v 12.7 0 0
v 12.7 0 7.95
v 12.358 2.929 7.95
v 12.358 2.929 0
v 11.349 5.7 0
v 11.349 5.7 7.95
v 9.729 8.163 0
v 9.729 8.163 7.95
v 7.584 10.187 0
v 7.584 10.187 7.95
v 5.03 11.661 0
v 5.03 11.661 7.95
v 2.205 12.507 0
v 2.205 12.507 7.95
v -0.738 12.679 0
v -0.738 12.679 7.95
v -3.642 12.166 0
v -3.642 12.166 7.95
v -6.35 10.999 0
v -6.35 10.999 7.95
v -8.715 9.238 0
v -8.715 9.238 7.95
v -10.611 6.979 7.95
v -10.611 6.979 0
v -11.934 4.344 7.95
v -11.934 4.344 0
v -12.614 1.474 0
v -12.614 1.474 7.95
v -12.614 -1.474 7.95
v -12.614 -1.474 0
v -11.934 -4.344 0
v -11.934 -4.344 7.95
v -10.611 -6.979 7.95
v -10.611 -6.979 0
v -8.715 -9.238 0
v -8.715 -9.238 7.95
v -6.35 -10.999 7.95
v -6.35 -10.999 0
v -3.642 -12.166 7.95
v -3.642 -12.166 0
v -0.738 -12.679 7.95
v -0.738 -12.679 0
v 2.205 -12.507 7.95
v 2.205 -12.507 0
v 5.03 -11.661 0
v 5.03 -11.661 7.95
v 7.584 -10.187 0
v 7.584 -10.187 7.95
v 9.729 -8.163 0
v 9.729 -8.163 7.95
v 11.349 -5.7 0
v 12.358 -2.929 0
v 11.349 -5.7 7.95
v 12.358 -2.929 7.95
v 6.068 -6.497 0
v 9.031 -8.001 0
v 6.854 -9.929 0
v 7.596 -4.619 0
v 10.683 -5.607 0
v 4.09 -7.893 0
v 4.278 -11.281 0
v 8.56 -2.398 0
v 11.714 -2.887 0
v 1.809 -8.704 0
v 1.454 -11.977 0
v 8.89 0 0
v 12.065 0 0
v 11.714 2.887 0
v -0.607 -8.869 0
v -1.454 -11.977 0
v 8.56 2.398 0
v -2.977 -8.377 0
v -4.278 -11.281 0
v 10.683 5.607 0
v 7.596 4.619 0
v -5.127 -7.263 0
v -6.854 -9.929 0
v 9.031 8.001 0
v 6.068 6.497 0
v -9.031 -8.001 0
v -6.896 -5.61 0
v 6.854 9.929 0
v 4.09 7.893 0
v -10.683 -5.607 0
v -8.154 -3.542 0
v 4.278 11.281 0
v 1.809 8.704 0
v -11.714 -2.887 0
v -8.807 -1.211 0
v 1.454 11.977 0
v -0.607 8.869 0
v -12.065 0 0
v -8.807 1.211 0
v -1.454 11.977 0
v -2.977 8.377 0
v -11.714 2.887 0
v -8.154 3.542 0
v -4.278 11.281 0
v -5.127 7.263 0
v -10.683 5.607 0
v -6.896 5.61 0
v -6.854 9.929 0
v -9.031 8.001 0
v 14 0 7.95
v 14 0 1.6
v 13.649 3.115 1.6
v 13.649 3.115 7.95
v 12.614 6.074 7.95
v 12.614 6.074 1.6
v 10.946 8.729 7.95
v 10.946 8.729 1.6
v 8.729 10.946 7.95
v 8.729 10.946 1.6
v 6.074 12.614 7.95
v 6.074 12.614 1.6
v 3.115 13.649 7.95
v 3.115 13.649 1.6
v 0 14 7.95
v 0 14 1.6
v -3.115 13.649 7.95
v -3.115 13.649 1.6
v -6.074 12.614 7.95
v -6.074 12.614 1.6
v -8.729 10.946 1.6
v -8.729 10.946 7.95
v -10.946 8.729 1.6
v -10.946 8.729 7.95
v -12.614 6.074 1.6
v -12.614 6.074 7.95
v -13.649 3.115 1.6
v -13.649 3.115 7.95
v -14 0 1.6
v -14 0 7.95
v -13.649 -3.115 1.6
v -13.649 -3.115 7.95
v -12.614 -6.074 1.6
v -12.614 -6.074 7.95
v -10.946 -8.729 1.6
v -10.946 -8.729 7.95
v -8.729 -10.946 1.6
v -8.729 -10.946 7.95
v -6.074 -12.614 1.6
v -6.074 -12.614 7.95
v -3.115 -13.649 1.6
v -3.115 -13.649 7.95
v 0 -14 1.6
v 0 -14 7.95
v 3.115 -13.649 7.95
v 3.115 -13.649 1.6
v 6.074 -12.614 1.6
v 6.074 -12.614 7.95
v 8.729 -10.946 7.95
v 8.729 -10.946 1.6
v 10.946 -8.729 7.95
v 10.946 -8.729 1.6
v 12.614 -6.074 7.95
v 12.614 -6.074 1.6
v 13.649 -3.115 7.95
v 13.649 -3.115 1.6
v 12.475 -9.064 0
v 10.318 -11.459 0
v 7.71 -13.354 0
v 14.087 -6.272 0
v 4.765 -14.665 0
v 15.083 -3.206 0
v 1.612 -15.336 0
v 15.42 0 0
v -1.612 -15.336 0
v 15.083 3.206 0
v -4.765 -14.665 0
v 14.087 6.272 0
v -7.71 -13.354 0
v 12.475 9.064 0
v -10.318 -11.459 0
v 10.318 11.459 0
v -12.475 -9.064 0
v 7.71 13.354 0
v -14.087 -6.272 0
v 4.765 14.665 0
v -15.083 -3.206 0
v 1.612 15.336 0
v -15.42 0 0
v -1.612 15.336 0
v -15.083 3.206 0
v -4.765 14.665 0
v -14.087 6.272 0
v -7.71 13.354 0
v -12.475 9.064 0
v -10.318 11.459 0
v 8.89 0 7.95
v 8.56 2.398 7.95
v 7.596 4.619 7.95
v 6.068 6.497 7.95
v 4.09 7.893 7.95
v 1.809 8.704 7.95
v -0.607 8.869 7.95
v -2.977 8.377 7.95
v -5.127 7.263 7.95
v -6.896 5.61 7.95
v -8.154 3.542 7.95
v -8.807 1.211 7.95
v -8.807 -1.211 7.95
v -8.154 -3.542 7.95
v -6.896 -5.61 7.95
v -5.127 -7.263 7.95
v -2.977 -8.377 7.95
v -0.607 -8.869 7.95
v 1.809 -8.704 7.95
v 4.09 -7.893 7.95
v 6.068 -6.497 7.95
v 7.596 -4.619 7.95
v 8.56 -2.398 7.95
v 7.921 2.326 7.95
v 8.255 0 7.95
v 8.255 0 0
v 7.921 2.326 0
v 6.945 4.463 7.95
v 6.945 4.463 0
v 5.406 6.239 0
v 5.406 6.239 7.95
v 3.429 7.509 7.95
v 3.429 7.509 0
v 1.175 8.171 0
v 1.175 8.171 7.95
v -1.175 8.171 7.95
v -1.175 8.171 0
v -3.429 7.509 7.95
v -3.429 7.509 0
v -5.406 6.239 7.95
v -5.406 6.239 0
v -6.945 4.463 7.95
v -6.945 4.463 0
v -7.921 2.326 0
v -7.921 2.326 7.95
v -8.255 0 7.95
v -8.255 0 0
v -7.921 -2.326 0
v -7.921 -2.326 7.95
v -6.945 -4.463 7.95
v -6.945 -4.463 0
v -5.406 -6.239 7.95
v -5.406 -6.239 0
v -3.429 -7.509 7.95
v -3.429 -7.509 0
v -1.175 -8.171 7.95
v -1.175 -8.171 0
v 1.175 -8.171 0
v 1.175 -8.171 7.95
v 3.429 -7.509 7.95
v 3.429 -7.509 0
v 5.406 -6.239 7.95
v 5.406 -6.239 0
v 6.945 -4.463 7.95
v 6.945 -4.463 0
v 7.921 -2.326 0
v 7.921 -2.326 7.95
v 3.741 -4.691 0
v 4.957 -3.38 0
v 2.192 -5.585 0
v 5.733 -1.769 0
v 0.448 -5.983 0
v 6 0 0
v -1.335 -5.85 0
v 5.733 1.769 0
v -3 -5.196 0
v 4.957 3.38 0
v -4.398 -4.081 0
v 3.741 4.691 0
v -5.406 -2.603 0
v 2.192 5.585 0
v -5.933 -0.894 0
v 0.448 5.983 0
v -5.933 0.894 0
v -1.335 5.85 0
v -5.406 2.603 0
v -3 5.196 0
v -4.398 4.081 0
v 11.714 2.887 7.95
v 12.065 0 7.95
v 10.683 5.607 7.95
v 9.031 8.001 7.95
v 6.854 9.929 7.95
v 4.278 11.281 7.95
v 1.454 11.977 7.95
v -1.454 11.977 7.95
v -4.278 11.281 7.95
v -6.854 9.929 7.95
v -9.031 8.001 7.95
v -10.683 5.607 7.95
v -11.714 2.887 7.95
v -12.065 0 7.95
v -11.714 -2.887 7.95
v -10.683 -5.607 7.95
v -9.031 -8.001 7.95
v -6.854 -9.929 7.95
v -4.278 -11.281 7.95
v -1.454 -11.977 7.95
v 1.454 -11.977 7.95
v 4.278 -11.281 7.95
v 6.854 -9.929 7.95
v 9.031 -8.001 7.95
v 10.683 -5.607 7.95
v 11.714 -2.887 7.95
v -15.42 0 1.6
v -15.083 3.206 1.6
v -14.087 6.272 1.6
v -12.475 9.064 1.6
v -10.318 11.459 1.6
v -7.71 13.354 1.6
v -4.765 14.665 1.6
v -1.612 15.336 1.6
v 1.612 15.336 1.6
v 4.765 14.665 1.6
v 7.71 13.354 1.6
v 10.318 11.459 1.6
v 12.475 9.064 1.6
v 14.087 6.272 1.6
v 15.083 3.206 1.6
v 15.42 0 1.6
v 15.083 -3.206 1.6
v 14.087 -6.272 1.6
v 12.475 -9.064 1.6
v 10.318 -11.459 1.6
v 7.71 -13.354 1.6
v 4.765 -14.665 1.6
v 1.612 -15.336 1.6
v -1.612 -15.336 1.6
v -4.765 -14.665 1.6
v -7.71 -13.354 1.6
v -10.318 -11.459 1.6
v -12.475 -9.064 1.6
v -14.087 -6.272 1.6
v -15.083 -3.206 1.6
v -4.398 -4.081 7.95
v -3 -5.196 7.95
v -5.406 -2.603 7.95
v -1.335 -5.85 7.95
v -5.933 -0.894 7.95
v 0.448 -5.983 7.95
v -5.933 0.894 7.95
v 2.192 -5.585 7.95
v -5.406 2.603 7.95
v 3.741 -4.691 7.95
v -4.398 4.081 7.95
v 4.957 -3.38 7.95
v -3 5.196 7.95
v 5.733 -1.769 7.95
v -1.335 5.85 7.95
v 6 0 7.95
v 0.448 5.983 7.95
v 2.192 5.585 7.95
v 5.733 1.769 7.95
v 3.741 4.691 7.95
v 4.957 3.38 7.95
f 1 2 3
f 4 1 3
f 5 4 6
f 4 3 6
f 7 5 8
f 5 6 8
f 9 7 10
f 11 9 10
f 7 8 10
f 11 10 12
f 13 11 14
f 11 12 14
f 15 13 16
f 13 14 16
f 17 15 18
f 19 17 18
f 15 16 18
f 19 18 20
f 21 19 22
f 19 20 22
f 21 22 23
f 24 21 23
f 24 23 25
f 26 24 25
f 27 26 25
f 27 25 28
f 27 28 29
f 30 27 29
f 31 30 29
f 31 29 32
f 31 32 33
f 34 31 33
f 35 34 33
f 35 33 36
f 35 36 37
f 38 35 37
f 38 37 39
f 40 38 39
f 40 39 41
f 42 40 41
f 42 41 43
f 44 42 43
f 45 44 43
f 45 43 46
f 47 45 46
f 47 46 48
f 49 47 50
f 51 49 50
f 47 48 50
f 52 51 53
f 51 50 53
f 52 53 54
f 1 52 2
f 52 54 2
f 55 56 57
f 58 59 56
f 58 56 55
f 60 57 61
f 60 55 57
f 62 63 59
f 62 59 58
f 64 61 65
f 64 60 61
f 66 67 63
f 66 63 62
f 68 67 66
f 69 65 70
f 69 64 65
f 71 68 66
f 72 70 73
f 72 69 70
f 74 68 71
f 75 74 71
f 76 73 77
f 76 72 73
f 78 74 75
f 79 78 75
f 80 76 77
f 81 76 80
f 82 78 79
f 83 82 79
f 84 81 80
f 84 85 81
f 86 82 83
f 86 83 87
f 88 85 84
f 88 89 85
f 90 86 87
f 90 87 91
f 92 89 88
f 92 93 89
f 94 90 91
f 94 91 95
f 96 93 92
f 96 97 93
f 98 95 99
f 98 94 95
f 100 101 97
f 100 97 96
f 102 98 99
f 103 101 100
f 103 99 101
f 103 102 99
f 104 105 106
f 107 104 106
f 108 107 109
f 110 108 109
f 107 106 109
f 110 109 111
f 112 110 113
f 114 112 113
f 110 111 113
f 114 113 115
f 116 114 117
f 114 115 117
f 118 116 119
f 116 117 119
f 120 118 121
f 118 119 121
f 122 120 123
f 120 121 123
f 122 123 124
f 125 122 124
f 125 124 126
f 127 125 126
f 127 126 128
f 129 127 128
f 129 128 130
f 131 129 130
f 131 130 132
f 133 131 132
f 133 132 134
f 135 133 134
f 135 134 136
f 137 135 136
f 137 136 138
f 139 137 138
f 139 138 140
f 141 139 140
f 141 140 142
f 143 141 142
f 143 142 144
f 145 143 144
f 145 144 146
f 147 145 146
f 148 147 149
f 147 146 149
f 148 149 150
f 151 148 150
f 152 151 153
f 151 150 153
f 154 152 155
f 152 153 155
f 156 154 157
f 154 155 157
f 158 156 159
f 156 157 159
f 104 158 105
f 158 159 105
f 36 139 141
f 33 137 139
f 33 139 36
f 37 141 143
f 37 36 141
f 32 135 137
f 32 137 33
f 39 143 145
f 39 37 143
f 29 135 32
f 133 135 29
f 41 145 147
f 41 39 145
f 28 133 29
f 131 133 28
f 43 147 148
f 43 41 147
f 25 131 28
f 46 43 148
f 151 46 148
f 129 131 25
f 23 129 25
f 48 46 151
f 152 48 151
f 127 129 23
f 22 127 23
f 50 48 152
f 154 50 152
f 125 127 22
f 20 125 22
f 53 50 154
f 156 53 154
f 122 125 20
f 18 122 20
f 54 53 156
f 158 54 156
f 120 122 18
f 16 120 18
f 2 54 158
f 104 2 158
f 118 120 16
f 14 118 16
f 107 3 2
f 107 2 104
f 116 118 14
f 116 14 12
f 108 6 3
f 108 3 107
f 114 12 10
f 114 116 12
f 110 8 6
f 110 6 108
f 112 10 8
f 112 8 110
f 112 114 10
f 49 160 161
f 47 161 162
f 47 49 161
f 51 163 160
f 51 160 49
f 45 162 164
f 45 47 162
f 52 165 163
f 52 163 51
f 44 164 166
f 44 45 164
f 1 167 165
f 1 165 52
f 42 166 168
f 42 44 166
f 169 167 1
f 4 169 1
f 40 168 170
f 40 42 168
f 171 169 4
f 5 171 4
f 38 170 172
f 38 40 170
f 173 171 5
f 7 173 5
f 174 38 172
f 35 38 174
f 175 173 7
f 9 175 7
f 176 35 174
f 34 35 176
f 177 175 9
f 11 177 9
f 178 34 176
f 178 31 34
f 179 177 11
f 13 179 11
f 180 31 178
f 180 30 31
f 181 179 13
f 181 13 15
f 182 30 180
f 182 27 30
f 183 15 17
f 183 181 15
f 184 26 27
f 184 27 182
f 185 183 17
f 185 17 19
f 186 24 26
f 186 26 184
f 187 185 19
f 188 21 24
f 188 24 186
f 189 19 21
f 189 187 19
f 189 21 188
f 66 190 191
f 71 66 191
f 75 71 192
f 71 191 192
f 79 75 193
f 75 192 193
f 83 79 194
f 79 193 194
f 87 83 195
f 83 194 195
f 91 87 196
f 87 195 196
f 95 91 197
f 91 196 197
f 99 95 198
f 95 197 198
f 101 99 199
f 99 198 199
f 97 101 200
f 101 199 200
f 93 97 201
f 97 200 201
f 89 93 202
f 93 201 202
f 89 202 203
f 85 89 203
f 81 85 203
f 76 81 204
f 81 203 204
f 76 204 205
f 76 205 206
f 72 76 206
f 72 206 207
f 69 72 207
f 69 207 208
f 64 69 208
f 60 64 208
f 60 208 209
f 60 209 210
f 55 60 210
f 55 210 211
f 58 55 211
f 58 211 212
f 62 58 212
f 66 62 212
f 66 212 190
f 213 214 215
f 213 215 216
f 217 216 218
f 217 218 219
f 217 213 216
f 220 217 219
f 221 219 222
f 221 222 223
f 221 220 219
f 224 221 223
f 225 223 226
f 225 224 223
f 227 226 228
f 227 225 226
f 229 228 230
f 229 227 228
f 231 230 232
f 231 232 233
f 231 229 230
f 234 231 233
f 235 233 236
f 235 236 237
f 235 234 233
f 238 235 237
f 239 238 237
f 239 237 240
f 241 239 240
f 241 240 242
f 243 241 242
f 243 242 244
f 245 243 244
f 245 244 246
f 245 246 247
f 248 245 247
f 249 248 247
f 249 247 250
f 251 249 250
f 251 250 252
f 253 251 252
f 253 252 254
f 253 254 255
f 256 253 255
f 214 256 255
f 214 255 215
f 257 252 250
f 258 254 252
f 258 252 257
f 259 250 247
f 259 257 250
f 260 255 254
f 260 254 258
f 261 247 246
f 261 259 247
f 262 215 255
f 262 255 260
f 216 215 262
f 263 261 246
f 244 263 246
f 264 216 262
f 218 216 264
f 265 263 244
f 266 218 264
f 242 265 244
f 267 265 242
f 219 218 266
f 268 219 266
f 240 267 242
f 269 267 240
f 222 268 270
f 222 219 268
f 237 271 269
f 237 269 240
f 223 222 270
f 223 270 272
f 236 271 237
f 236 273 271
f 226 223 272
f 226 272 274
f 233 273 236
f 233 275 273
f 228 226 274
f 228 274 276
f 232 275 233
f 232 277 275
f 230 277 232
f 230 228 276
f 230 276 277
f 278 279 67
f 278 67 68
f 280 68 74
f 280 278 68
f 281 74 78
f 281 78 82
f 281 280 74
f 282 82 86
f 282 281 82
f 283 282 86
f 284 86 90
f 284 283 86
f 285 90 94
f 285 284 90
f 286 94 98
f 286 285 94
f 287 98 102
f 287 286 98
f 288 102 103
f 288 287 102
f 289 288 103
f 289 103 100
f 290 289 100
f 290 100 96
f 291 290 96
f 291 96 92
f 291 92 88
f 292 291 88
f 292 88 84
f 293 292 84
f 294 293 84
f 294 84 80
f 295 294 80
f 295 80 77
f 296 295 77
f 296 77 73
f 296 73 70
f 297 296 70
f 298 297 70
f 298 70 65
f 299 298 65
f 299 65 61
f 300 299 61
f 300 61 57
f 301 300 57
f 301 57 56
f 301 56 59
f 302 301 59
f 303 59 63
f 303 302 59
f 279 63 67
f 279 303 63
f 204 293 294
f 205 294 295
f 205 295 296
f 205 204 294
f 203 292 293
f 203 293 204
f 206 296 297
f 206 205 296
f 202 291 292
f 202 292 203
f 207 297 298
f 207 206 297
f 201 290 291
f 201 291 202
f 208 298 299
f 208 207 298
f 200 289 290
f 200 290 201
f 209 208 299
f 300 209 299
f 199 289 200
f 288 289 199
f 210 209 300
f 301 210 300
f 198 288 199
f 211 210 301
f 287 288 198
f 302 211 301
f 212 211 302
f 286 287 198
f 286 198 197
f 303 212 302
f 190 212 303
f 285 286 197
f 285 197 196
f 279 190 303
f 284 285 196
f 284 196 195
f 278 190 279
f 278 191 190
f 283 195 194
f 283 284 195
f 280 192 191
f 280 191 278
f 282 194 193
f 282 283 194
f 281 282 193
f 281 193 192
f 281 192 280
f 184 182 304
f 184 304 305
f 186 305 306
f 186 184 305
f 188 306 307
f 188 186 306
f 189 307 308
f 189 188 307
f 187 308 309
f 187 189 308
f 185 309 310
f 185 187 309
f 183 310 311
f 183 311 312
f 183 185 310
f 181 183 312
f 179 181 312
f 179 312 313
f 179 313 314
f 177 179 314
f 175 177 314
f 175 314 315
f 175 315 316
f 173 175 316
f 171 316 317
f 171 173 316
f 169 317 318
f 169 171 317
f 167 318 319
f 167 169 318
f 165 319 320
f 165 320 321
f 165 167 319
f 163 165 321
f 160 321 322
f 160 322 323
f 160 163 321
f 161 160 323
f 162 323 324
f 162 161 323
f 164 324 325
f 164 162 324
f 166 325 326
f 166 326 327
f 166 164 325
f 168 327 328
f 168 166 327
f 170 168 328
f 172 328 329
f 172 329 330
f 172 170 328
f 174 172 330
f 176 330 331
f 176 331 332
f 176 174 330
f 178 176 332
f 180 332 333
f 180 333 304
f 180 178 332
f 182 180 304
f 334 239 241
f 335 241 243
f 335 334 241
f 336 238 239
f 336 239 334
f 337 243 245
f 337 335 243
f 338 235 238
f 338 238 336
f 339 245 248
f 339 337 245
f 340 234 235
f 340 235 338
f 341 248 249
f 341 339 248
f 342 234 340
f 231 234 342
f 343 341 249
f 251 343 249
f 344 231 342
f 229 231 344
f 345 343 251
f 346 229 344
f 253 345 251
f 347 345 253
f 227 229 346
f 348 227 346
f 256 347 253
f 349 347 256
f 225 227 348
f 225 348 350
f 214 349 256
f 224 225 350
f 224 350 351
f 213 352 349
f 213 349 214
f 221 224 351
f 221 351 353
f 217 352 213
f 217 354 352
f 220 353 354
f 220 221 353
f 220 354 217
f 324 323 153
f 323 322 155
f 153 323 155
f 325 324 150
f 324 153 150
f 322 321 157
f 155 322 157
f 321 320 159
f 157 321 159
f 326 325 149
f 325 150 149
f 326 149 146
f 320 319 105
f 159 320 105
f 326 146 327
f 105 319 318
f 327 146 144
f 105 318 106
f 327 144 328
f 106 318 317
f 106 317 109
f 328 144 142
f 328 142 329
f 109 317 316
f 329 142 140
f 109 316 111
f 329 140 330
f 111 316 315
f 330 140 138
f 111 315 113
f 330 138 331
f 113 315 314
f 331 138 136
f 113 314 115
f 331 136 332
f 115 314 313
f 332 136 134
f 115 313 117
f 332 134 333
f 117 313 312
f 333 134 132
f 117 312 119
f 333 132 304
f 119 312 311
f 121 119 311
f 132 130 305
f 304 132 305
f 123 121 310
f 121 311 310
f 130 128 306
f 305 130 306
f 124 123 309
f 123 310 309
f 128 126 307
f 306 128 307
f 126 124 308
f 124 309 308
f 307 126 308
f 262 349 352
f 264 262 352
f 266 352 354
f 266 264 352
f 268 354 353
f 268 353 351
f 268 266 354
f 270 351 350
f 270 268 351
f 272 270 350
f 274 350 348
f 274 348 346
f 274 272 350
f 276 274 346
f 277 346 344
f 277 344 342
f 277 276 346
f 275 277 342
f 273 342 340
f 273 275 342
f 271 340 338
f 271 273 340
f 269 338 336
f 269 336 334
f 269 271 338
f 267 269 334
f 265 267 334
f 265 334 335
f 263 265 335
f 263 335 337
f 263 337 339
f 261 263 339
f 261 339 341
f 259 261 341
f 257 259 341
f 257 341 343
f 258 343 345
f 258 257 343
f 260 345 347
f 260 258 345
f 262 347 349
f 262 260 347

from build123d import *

# Parameters (mm, degrees)
CROQUIS1_R              = 14
CROQUIS1_R_2            = 6
SALIENTE_EXTRUIR1_DEPTH = 7.9502
CROQUIS2_R              = 15.42
CROQUIS2_R_2            = 14
SALIENTE_EXTRUIR2_DEPTH = 1.6002
CROQUIS3_R              = 12.7
CROQUIS3_R_2            = 12.065
CROQUIS3_R_3            = 8.89
CROQUIS3_R_4            = 8.255
CORTAR_EXTRUIR1_DEPTH   = 25.4


with BuildPart() as part:
    # Croquis1 → Saliente-Extruir1 (new body)
    with BuildSketch(Plane.XY):
        Circle(CROQUIS1_R)
        Circle(CROQUIS1_R_2, mode=Mode.SUBTRACT)
    extrude(amount=SALIENTE_EXTRUIR1_DEPTH)

    # Croquis2 → Saliente-Extruir2 (add)
    with BuildSketch(Plane(origin=(0, 0, 0), x_dir=(-1, 0, 0), z_dir=(0, 0, -1))):
        Circle(CROQUIS2_R)
        Circle(CROQUIS2_R_2, mode=Mode.SUBTRACT)
    extrude(amount=-SALIENTE_EXTRUIR2_DEPTH)

    # Croquis3 → Cortar-Extruir1 (cut)
    # profile 1 of 2: a face of its own
    with BuildSketch(Plane.XY.offset(7.9502)):
        Circle(CROQUIS3_R)
        Circle(CROQUIS3_R_2, mode=Mode.SUBTRACT)
    # profile 2 of 2: a face of its own
    with BuildSketch(Plane.XY.offset(7.9502)):
        Circle(CROQUIS3_R_3)
        Circle(CROQUIS3_R_4, mode=Mode.SUBTRACT)
    extrude(amount=-CORTAR_EXTRUIR1_DEPTH, mode=Mode.SUBTRACT)


with BuildPart() as cortar_extruir1_piece_1:
    # of the separate pieces the step leaves, piece 1, a body of its own (cortar_extruir1_pieces)
    add(part.part.solids().sort_by_distance((12.065, 0, 7.9502))[0])


with BuildPart() as cortar_extruir1_piece_2:
    # of the separate pieces the step leaves, piece 2, a body of its own (cortar_extruir1_pieces)
    add(part.part.solids().sort_by_distance((14, 0, 1.6002))[0])


with BuildPart() as cortar_extruir1_piece_3:
    # of the separate pieces the step leaves, piece 3, a body of its own (cortar_extruir1_pieces)
    add(part.part.solids().sort_by_distance((8.255, 0, 7.9502))[0])


solid = Compound([cortar_extruir1_piece_1.part, cortar_extruir1_piece_2.part, cortar_extruir1_piece_3.part])
